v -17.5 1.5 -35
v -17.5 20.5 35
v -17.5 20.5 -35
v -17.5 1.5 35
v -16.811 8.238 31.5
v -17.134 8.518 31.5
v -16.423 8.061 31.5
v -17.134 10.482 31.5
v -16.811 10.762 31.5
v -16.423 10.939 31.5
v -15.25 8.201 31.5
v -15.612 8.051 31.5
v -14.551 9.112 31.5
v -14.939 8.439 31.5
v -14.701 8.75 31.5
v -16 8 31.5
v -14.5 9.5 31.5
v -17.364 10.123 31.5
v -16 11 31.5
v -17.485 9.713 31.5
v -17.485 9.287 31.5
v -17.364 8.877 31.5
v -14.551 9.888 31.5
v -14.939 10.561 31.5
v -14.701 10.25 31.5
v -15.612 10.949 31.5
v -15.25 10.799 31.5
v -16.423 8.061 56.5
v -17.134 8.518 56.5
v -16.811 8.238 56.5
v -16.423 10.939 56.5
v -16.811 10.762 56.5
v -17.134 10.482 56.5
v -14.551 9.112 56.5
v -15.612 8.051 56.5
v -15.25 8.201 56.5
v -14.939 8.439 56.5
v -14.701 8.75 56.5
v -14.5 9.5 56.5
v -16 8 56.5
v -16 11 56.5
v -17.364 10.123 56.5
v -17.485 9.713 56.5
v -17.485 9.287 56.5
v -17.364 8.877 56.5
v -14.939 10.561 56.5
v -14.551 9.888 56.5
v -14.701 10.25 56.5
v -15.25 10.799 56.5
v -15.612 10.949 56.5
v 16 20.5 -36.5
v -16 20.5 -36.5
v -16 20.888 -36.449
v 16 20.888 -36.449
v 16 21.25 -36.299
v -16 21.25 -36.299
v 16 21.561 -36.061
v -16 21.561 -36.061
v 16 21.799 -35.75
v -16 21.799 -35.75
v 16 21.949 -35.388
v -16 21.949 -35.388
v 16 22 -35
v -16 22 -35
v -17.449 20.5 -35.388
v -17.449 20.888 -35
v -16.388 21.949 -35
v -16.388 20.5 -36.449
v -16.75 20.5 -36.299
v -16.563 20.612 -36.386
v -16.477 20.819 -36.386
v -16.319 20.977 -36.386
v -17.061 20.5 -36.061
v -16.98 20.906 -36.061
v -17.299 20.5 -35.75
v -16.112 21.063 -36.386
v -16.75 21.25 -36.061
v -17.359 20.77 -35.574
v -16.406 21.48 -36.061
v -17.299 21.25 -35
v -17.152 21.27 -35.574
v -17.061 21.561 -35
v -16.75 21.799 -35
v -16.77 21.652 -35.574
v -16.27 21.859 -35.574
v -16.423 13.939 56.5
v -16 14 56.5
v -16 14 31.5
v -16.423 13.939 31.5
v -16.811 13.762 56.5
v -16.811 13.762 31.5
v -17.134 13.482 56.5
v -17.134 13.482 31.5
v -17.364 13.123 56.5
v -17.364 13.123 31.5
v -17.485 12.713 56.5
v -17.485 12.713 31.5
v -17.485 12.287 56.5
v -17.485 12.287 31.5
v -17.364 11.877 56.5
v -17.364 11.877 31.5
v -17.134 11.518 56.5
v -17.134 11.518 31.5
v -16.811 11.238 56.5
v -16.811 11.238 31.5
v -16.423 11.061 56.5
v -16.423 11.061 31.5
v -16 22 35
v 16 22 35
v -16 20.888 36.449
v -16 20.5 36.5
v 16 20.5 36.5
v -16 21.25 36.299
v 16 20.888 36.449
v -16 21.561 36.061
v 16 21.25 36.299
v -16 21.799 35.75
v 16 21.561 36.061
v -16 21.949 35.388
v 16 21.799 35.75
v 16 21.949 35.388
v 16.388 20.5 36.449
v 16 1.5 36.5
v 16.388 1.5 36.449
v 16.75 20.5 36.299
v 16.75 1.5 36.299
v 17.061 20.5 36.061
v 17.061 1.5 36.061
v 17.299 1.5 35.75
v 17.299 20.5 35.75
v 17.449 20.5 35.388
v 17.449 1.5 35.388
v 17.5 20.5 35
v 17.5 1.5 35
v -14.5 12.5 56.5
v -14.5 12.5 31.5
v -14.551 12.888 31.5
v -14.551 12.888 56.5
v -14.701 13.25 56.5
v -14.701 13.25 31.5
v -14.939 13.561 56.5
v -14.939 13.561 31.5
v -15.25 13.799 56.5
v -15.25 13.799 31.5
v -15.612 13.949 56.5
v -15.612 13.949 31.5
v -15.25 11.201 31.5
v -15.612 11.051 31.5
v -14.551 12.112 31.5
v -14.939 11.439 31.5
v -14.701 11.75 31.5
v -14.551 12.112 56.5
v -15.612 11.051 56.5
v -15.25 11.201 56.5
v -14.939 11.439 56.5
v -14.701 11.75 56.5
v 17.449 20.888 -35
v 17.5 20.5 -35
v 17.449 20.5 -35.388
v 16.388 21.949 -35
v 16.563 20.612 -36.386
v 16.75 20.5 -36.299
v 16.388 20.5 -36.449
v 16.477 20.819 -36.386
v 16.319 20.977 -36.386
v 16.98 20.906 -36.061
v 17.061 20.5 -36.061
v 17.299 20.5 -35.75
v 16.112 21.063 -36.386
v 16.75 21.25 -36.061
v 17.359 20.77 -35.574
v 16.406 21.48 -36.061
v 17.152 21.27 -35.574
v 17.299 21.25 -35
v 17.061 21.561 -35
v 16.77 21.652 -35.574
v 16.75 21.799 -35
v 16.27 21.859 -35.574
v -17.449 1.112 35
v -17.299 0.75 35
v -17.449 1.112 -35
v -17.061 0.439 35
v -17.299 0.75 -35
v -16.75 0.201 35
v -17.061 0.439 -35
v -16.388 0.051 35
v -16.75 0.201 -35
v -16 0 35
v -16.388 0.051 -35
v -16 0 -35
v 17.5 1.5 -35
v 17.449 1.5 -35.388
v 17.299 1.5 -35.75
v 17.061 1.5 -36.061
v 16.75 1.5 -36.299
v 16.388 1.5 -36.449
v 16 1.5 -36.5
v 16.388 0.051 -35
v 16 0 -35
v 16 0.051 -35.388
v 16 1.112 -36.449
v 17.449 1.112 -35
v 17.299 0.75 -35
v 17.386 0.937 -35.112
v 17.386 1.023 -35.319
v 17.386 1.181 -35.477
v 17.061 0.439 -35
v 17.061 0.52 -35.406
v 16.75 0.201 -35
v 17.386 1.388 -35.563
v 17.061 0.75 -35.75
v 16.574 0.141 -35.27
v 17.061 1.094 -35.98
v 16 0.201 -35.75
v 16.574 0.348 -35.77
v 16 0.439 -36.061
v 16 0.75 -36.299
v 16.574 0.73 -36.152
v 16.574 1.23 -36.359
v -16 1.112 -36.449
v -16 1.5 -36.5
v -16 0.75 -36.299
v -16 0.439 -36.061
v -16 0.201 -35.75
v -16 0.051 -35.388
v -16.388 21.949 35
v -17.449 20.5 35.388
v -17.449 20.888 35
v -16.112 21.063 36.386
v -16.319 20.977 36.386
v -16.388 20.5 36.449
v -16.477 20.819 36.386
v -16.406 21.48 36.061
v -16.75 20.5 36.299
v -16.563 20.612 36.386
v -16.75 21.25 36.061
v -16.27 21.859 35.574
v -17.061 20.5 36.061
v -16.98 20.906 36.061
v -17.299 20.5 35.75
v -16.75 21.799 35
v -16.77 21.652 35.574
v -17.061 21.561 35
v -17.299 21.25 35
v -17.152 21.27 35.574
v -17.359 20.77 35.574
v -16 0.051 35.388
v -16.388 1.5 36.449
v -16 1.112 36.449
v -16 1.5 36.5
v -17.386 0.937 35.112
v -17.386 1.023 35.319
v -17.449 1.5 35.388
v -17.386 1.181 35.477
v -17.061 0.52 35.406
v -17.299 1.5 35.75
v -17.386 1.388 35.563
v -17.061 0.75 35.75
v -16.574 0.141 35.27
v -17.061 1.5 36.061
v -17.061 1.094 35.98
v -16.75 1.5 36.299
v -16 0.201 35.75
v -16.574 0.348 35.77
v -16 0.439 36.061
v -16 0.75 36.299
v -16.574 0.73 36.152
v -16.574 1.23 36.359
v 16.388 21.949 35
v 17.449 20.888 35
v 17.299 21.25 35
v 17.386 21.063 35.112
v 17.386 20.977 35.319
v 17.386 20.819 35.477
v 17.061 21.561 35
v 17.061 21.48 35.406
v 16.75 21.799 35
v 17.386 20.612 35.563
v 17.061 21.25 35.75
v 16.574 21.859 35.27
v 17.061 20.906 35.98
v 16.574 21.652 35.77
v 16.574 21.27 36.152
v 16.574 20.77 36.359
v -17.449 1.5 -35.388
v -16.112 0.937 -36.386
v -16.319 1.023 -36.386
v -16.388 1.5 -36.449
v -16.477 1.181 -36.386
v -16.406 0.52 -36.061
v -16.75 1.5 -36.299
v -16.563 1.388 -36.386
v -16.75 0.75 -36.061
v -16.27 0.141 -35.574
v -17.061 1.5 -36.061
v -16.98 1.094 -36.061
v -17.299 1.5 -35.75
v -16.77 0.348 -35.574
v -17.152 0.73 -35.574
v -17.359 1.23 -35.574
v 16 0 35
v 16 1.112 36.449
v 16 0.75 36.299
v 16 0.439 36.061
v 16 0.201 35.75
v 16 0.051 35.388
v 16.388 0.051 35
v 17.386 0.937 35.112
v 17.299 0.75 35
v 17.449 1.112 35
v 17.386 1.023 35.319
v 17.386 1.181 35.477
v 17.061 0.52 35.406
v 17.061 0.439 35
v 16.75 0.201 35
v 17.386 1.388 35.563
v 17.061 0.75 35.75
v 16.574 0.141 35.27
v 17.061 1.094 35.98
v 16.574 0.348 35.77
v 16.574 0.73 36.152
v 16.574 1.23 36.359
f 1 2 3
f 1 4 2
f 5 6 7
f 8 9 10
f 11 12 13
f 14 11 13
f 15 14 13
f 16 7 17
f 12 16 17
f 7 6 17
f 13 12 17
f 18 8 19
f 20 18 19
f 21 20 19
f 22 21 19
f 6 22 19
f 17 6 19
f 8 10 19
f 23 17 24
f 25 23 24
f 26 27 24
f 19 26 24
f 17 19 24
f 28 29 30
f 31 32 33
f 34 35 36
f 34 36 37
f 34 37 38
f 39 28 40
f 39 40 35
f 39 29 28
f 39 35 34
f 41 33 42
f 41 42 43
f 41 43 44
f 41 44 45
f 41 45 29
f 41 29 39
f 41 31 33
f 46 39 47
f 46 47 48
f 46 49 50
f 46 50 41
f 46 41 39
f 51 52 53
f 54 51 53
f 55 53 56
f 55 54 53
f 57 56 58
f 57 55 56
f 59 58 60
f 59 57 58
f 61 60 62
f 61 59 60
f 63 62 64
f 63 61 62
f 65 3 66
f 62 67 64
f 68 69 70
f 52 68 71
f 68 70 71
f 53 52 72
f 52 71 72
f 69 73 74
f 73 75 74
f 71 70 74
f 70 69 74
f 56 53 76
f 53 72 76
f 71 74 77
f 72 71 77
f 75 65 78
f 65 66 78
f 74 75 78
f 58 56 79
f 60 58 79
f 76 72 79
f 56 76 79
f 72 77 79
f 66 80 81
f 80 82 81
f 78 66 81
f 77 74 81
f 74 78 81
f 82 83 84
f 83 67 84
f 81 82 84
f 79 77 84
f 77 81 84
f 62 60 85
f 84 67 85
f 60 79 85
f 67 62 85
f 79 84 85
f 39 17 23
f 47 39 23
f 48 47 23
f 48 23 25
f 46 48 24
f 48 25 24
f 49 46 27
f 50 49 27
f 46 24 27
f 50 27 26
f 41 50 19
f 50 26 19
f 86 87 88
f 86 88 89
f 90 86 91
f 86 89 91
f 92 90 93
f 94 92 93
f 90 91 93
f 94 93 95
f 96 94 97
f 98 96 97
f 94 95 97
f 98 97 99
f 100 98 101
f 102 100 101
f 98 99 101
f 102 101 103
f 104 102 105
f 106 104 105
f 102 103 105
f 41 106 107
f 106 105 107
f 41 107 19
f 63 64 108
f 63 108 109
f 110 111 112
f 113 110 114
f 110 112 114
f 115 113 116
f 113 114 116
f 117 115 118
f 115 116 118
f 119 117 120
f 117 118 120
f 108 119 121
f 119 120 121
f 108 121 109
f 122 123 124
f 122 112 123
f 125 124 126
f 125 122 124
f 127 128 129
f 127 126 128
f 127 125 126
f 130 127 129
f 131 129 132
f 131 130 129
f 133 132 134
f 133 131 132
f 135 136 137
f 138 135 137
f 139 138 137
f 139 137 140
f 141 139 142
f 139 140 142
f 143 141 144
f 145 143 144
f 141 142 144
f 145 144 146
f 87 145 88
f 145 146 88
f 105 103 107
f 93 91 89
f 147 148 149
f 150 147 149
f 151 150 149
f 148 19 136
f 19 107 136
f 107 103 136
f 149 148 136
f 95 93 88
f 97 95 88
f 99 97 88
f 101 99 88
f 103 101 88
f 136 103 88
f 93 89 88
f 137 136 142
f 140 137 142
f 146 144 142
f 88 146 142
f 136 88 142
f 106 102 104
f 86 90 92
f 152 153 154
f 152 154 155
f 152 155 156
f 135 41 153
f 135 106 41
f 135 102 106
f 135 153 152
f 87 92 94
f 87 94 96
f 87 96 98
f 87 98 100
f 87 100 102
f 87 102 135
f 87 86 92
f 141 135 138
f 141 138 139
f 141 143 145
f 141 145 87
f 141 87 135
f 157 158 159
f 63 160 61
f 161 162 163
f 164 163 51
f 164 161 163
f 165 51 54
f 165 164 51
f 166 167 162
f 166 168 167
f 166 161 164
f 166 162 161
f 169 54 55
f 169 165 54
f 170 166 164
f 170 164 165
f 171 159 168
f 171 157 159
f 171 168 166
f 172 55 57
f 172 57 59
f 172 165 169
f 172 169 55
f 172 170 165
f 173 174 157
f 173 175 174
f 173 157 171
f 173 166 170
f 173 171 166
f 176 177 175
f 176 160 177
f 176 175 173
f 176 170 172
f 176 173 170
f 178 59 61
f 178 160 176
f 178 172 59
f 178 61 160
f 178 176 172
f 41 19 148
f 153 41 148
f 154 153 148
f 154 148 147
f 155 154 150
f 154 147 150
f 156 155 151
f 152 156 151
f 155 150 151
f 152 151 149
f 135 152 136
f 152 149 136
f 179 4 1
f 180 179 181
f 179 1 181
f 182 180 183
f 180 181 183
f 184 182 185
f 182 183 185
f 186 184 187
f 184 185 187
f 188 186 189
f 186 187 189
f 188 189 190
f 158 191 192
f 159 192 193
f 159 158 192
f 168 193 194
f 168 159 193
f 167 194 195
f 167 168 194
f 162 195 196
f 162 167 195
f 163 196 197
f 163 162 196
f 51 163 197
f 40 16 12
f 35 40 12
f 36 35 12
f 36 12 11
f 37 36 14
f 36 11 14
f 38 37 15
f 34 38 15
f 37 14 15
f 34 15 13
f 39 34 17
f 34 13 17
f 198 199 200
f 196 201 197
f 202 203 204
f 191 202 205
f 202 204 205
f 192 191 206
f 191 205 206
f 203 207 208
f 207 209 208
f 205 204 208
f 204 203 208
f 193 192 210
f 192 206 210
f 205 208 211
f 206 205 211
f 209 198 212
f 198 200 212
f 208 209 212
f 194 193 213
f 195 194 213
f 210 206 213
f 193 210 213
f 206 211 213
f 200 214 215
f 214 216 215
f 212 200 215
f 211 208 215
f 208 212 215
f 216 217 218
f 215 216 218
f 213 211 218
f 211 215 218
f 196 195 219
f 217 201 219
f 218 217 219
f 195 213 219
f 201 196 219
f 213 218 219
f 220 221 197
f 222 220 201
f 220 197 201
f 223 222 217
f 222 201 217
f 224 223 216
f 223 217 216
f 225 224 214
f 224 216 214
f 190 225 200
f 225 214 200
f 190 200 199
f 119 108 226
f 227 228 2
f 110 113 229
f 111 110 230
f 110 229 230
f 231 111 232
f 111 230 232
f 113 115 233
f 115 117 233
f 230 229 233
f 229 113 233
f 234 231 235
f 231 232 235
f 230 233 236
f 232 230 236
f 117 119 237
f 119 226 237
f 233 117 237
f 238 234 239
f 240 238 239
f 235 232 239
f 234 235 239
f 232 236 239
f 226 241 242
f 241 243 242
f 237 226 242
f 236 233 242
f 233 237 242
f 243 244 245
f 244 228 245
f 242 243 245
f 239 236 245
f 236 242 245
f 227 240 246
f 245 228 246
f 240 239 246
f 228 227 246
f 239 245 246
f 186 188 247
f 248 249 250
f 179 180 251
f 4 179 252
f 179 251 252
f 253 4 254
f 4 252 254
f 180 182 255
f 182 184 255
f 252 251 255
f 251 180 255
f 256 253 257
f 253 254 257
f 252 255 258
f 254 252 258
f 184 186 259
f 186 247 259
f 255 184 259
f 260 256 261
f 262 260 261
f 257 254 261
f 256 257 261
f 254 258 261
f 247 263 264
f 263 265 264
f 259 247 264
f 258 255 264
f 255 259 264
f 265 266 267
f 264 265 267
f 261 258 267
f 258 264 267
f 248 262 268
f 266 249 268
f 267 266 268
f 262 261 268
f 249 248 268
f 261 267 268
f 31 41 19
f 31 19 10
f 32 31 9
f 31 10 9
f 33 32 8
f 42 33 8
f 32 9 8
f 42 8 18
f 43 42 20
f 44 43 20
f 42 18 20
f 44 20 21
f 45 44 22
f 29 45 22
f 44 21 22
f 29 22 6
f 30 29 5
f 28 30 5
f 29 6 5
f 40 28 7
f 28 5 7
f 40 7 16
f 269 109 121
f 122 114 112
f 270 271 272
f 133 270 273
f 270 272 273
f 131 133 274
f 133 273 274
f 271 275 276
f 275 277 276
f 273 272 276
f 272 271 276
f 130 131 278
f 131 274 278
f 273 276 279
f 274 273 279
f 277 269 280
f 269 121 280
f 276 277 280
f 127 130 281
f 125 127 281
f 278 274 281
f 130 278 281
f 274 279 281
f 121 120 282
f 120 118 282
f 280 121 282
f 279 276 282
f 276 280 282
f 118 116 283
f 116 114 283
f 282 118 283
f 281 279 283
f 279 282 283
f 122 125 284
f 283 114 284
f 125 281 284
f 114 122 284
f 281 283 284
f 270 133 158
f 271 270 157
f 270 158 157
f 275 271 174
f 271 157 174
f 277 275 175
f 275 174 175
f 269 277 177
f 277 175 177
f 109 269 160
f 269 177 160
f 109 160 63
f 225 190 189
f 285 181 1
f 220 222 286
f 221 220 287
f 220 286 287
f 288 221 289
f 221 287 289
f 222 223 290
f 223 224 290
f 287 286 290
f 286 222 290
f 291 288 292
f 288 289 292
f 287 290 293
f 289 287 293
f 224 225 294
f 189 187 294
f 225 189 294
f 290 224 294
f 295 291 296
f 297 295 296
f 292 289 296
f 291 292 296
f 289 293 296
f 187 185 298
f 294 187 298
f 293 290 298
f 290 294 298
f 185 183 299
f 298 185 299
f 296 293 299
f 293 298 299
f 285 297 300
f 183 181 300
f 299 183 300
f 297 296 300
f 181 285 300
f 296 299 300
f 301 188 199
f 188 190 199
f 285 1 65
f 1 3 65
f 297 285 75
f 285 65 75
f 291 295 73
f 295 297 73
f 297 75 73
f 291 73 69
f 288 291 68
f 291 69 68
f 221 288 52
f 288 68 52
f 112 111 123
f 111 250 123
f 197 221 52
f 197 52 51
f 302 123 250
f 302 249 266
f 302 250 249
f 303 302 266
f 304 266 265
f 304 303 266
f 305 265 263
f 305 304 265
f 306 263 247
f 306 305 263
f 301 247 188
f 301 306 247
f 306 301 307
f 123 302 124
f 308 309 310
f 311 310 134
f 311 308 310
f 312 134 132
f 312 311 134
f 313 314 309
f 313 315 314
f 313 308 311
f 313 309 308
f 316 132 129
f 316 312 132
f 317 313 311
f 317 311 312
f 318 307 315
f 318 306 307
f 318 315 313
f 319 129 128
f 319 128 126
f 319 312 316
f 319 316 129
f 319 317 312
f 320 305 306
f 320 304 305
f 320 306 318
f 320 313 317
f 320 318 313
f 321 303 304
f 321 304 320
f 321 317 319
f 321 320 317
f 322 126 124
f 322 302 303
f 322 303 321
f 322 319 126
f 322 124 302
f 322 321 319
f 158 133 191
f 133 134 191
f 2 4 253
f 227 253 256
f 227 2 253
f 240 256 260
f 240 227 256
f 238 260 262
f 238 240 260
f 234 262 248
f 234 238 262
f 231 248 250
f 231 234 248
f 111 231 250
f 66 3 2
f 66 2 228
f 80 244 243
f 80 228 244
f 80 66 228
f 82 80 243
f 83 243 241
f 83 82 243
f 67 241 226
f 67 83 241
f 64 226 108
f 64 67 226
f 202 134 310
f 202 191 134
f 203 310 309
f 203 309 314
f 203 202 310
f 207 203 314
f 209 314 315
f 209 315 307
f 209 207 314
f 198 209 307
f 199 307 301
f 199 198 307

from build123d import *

# Parameters (mm, degrees)
SKETCH1_W                = 35
SKETCH1_H                = 73
BOSS_EXTRUDE1_DEPTH      = 22
FILLET1_R                = 1.5
BOSS_EXTRUDE5_DEPTH      = 20
BOSS_EXTRUDE5_DEPTH_BACK = 5


with BuildPart() as part:
    # Sketch1 → Boss-Extrude1 (new body)
    with BuildSketch(Plane(origin=(0, 0, 0), x_dir=(1, 0, 0), z_dir=(0, 1, 0))):
        Rectangle(SKETCH1_W, SKETCH1_H)
    extrude(amount=BOSS_EXTRUDE1_DEPTH)

    # Fillet1
    fillet1_edges = [part.edges().sort_by_distance(p)[0] for p in [
        (-17.5, 22, 0),
        (0, 22, 36.5),
        (17.5, 22, 0),
        (0, 0, 36.5),
        (-17.5, 0, 0),
        (0, 0, -36.5),
        (17.5, 0, 0),
        (17.5, 11, 36.5),
        (-17.5, 11, 36.5),
        (-17.5, 11, -36.5),
        (17.5, 11, -36.5),
        (0, 22, -36.5),
    ]]
    fillet(fillet1_edges, radius=FILLET1_R)


with BuildPart() as body_2:
    # Sketch2 → Boss-Extrude5 (new, two sides: drawn at the far end of the back side and taken through both)
    with BuildSketch(Plane.XY.offset(36.5).offset(-BOSS_EXTRUDE5_DEPTH_BACK)):
        with BuildLine():
            ThreePointArc((-16, 11), (-14.939339828, 11.439339828), (-14.5, 12.5))
            ThreePointArc((-14.5, 12.5), (-14.939339828, 13.560660172), (-16, 14))
            Line((-16, 14), (-16, 11))
        make_face()
        with BuildLine():
            Line((-16, 11), (-16, 14))
            ThreePointArc((-16, 14), (-17.5, 12.5), (-16, 11))
        make_face()
        with BuildLine():
            ThreePointArc((-14.5, 9.5), (-14.939339828, 10.560660172), (-16, 11))
            Line((-16, 11), (-16, 8))
            ThreePointArc((-16, 8), (-14.939339828, 8.439339828), (-14.5, 9.5))
        make_face()
        with BuildLine():
            Line((-16, 8), (-16, 11))
            ThreePointArc((-16, 11), (-17.5, 9.5), (-16, 8))
        make_face()
    extrude(amount=BOSS_EXTRUDE5_DEPTH + BOSS_EXTRUDE5_DEPTH_BACK)


solid = Compound([part.part, body_2.part])
